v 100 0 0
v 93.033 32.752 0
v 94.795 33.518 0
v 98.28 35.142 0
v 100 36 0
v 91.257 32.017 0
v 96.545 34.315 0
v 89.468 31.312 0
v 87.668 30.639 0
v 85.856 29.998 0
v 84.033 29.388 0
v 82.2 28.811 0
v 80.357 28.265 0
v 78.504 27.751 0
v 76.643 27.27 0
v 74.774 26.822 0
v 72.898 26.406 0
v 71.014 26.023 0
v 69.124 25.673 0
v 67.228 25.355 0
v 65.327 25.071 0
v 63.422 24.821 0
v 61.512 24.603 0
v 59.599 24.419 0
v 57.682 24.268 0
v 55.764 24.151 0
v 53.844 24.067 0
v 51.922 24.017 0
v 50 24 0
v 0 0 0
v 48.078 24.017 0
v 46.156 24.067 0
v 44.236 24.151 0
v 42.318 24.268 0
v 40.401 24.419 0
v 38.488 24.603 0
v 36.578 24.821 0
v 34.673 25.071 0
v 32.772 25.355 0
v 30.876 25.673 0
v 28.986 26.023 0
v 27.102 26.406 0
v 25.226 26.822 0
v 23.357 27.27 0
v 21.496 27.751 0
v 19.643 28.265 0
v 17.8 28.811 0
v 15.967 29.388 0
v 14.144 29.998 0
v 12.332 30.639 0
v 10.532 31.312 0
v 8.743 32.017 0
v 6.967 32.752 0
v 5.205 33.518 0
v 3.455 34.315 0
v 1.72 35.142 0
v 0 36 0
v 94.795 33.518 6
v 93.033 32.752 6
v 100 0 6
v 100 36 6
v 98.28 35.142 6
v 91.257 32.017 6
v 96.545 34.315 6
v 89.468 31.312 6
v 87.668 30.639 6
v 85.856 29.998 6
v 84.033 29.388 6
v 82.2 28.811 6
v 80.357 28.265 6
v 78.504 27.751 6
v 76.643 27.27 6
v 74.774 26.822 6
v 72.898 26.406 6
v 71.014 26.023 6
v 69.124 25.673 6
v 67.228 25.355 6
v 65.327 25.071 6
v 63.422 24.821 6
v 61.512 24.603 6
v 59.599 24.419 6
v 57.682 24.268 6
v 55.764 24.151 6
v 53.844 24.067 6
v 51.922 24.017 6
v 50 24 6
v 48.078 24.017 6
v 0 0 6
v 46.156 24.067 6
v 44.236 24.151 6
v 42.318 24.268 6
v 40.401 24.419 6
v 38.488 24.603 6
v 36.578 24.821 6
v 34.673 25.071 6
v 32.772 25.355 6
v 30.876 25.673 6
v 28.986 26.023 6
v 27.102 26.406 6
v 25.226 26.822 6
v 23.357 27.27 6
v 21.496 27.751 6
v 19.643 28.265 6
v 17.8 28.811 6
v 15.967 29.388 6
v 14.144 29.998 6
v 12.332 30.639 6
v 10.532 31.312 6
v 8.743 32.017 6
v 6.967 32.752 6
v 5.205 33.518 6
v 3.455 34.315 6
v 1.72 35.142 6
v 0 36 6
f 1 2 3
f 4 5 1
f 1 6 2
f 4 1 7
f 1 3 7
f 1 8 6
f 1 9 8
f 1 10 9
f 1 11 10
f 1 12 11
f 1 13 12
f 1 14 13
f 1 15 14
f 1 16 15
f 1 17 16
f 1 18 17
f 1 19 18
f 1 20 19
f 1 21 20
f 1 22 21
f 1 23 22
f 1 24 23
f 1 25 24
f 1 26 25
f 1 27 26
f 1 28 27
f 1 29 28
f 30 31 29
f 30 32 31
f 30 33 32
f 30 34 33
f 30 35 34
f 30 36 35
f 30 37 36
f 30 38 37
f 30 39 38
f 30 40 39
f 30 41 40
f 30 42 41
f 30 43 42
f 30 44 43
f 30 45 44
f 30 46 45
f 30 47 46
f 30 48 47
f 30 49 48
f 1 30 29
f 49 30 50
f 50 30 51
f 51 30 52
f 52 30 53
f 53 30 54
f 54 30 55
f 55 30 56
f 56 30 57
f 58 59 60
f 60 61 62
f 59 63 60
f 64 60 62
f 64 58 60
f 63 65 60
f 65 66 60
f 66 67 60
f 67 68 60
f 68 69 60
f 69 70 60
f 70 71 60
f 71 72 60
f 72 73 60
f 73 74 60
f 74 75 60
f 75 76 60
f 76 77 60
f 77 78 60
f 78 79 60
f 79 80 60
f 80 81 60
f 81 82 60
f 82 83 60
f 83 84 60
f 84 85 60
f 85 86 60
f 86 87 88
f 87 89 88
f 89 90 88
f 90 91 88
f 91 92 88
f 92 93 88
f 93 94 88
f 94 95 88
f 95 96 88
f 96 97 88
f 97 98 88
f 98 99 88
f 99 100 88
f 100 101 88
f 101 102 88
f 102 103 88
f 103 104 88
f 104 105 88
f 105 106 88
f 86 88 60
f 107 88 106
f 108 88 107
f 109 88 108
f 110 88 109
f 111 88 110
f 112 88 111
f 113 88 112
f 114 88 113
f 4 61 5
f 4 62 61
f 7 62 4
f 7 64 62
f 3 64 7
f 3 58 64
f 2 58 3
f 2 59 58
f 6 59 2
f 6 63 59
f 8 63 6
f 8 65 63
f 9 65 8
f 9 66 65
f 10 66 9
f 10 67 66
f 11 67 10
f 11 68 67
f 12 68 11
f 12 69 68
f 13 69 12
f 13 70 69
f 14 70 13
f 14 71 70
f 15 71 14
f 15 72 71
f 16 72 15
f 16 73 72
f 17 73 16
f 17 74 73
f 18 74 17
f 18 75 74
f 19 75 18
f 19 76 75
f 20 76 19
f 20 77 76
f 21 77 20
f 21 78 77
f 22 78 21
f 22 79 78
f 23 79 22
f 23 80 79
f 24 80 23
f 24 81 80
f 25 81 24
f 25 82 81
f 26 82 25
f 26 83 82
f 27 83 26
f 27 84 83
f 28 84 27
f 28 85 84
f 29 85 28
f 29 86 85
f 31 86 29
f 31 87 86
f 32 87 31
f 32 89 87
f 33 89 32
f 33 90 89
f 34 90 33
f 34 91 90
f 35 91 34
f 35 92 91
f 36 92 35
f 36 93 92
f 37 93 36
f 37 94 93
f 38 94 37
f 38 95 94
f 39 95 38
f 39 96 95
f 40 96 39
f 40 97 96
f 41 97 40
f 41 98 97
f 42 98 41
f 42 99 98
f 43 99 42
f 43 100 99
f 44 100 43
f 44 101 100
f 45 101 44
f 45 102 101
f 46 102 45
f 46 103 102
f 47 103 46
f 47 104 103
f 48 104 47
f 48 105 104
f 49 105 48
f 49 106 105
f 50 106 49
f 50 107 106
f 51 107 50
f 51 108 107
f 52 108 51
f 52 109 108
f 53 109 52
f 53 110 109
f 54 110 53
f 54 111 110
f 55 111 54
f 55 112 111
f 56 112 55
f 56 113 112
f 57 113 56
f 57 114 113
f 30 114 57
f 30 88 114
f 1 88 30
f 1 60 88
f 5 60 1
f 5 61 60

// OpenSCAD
$fn = 32;

// ----------------------------------------------------------------------
// Arc profile plate: notch, 57 points
// ----------------------------------------------------------------------

// --- parameters (mm) ---
bar_l = 100;              // bar length, X
bar_w = 36;               // bar width, Y
notch_depth = 12;         // depth of the arc notch at mid-span
arc_r = 110.17;           // radius of the notch arc
arc_angle = 53.98;        // notch arc angle, degrees
arc_step = 1;             // sampling step of the notch arc, degrees
plate_t = 6;              // plate thickness, Z

profile = [[0, 0], [100, 0], [100, 36], [98.28, 35.142], [96.545, 34.315], [94.795, 33.518], [93.033, 32.752], [91.257, 32.017], [89.468, 31.312], [87.668, 30.639], [85.856, 29.998], [84.033, 29.388], [82.2, 28.811], [80.357, 28.265], [78.504, 27.751], [76.643, 27.27], [74.774, 26.822], [72.898, 26.406], [71.014, 26.023], [69.124, 25.673], [67.228, 25.355], [65.327, 25.071], [63.422, 24.821], [61.512, 24.603], [59.599, 24.419], [57.682, 24.268], [55.764, 24.151], [53.844, 24.067], [51.922, 24.017], [50, 24], [48.078, 24.017], [46.156, 24.067], [44.236, 24.151], [42.318, 24.268], [40.401, 24.419], [38.488, 24.603], [36.578, 24.821], [34.673, 25.071], [32.772, 25.355], [30.876, 25.673], [28.986, 26.023], [27.102, 26.406], [25.226, 26.822], [23.357, 27.27], [21.496, 27.751], [19.643, 28.265], [17.8, 28.811], [15.967, 29.388], [14.144, 29.998], [12.332, 30.639], [10.532, 31.312], [8.743, 32.017], [6.967, 32.752], [5.205, 33.518], [3.455, 34.315], [1.72, 35.142], [0, 36]];  // primary outline, 57 points, counter clockwise

// --- the one profile operation ---
linear_extrude(height = plate_t) polygon(points = profile);
